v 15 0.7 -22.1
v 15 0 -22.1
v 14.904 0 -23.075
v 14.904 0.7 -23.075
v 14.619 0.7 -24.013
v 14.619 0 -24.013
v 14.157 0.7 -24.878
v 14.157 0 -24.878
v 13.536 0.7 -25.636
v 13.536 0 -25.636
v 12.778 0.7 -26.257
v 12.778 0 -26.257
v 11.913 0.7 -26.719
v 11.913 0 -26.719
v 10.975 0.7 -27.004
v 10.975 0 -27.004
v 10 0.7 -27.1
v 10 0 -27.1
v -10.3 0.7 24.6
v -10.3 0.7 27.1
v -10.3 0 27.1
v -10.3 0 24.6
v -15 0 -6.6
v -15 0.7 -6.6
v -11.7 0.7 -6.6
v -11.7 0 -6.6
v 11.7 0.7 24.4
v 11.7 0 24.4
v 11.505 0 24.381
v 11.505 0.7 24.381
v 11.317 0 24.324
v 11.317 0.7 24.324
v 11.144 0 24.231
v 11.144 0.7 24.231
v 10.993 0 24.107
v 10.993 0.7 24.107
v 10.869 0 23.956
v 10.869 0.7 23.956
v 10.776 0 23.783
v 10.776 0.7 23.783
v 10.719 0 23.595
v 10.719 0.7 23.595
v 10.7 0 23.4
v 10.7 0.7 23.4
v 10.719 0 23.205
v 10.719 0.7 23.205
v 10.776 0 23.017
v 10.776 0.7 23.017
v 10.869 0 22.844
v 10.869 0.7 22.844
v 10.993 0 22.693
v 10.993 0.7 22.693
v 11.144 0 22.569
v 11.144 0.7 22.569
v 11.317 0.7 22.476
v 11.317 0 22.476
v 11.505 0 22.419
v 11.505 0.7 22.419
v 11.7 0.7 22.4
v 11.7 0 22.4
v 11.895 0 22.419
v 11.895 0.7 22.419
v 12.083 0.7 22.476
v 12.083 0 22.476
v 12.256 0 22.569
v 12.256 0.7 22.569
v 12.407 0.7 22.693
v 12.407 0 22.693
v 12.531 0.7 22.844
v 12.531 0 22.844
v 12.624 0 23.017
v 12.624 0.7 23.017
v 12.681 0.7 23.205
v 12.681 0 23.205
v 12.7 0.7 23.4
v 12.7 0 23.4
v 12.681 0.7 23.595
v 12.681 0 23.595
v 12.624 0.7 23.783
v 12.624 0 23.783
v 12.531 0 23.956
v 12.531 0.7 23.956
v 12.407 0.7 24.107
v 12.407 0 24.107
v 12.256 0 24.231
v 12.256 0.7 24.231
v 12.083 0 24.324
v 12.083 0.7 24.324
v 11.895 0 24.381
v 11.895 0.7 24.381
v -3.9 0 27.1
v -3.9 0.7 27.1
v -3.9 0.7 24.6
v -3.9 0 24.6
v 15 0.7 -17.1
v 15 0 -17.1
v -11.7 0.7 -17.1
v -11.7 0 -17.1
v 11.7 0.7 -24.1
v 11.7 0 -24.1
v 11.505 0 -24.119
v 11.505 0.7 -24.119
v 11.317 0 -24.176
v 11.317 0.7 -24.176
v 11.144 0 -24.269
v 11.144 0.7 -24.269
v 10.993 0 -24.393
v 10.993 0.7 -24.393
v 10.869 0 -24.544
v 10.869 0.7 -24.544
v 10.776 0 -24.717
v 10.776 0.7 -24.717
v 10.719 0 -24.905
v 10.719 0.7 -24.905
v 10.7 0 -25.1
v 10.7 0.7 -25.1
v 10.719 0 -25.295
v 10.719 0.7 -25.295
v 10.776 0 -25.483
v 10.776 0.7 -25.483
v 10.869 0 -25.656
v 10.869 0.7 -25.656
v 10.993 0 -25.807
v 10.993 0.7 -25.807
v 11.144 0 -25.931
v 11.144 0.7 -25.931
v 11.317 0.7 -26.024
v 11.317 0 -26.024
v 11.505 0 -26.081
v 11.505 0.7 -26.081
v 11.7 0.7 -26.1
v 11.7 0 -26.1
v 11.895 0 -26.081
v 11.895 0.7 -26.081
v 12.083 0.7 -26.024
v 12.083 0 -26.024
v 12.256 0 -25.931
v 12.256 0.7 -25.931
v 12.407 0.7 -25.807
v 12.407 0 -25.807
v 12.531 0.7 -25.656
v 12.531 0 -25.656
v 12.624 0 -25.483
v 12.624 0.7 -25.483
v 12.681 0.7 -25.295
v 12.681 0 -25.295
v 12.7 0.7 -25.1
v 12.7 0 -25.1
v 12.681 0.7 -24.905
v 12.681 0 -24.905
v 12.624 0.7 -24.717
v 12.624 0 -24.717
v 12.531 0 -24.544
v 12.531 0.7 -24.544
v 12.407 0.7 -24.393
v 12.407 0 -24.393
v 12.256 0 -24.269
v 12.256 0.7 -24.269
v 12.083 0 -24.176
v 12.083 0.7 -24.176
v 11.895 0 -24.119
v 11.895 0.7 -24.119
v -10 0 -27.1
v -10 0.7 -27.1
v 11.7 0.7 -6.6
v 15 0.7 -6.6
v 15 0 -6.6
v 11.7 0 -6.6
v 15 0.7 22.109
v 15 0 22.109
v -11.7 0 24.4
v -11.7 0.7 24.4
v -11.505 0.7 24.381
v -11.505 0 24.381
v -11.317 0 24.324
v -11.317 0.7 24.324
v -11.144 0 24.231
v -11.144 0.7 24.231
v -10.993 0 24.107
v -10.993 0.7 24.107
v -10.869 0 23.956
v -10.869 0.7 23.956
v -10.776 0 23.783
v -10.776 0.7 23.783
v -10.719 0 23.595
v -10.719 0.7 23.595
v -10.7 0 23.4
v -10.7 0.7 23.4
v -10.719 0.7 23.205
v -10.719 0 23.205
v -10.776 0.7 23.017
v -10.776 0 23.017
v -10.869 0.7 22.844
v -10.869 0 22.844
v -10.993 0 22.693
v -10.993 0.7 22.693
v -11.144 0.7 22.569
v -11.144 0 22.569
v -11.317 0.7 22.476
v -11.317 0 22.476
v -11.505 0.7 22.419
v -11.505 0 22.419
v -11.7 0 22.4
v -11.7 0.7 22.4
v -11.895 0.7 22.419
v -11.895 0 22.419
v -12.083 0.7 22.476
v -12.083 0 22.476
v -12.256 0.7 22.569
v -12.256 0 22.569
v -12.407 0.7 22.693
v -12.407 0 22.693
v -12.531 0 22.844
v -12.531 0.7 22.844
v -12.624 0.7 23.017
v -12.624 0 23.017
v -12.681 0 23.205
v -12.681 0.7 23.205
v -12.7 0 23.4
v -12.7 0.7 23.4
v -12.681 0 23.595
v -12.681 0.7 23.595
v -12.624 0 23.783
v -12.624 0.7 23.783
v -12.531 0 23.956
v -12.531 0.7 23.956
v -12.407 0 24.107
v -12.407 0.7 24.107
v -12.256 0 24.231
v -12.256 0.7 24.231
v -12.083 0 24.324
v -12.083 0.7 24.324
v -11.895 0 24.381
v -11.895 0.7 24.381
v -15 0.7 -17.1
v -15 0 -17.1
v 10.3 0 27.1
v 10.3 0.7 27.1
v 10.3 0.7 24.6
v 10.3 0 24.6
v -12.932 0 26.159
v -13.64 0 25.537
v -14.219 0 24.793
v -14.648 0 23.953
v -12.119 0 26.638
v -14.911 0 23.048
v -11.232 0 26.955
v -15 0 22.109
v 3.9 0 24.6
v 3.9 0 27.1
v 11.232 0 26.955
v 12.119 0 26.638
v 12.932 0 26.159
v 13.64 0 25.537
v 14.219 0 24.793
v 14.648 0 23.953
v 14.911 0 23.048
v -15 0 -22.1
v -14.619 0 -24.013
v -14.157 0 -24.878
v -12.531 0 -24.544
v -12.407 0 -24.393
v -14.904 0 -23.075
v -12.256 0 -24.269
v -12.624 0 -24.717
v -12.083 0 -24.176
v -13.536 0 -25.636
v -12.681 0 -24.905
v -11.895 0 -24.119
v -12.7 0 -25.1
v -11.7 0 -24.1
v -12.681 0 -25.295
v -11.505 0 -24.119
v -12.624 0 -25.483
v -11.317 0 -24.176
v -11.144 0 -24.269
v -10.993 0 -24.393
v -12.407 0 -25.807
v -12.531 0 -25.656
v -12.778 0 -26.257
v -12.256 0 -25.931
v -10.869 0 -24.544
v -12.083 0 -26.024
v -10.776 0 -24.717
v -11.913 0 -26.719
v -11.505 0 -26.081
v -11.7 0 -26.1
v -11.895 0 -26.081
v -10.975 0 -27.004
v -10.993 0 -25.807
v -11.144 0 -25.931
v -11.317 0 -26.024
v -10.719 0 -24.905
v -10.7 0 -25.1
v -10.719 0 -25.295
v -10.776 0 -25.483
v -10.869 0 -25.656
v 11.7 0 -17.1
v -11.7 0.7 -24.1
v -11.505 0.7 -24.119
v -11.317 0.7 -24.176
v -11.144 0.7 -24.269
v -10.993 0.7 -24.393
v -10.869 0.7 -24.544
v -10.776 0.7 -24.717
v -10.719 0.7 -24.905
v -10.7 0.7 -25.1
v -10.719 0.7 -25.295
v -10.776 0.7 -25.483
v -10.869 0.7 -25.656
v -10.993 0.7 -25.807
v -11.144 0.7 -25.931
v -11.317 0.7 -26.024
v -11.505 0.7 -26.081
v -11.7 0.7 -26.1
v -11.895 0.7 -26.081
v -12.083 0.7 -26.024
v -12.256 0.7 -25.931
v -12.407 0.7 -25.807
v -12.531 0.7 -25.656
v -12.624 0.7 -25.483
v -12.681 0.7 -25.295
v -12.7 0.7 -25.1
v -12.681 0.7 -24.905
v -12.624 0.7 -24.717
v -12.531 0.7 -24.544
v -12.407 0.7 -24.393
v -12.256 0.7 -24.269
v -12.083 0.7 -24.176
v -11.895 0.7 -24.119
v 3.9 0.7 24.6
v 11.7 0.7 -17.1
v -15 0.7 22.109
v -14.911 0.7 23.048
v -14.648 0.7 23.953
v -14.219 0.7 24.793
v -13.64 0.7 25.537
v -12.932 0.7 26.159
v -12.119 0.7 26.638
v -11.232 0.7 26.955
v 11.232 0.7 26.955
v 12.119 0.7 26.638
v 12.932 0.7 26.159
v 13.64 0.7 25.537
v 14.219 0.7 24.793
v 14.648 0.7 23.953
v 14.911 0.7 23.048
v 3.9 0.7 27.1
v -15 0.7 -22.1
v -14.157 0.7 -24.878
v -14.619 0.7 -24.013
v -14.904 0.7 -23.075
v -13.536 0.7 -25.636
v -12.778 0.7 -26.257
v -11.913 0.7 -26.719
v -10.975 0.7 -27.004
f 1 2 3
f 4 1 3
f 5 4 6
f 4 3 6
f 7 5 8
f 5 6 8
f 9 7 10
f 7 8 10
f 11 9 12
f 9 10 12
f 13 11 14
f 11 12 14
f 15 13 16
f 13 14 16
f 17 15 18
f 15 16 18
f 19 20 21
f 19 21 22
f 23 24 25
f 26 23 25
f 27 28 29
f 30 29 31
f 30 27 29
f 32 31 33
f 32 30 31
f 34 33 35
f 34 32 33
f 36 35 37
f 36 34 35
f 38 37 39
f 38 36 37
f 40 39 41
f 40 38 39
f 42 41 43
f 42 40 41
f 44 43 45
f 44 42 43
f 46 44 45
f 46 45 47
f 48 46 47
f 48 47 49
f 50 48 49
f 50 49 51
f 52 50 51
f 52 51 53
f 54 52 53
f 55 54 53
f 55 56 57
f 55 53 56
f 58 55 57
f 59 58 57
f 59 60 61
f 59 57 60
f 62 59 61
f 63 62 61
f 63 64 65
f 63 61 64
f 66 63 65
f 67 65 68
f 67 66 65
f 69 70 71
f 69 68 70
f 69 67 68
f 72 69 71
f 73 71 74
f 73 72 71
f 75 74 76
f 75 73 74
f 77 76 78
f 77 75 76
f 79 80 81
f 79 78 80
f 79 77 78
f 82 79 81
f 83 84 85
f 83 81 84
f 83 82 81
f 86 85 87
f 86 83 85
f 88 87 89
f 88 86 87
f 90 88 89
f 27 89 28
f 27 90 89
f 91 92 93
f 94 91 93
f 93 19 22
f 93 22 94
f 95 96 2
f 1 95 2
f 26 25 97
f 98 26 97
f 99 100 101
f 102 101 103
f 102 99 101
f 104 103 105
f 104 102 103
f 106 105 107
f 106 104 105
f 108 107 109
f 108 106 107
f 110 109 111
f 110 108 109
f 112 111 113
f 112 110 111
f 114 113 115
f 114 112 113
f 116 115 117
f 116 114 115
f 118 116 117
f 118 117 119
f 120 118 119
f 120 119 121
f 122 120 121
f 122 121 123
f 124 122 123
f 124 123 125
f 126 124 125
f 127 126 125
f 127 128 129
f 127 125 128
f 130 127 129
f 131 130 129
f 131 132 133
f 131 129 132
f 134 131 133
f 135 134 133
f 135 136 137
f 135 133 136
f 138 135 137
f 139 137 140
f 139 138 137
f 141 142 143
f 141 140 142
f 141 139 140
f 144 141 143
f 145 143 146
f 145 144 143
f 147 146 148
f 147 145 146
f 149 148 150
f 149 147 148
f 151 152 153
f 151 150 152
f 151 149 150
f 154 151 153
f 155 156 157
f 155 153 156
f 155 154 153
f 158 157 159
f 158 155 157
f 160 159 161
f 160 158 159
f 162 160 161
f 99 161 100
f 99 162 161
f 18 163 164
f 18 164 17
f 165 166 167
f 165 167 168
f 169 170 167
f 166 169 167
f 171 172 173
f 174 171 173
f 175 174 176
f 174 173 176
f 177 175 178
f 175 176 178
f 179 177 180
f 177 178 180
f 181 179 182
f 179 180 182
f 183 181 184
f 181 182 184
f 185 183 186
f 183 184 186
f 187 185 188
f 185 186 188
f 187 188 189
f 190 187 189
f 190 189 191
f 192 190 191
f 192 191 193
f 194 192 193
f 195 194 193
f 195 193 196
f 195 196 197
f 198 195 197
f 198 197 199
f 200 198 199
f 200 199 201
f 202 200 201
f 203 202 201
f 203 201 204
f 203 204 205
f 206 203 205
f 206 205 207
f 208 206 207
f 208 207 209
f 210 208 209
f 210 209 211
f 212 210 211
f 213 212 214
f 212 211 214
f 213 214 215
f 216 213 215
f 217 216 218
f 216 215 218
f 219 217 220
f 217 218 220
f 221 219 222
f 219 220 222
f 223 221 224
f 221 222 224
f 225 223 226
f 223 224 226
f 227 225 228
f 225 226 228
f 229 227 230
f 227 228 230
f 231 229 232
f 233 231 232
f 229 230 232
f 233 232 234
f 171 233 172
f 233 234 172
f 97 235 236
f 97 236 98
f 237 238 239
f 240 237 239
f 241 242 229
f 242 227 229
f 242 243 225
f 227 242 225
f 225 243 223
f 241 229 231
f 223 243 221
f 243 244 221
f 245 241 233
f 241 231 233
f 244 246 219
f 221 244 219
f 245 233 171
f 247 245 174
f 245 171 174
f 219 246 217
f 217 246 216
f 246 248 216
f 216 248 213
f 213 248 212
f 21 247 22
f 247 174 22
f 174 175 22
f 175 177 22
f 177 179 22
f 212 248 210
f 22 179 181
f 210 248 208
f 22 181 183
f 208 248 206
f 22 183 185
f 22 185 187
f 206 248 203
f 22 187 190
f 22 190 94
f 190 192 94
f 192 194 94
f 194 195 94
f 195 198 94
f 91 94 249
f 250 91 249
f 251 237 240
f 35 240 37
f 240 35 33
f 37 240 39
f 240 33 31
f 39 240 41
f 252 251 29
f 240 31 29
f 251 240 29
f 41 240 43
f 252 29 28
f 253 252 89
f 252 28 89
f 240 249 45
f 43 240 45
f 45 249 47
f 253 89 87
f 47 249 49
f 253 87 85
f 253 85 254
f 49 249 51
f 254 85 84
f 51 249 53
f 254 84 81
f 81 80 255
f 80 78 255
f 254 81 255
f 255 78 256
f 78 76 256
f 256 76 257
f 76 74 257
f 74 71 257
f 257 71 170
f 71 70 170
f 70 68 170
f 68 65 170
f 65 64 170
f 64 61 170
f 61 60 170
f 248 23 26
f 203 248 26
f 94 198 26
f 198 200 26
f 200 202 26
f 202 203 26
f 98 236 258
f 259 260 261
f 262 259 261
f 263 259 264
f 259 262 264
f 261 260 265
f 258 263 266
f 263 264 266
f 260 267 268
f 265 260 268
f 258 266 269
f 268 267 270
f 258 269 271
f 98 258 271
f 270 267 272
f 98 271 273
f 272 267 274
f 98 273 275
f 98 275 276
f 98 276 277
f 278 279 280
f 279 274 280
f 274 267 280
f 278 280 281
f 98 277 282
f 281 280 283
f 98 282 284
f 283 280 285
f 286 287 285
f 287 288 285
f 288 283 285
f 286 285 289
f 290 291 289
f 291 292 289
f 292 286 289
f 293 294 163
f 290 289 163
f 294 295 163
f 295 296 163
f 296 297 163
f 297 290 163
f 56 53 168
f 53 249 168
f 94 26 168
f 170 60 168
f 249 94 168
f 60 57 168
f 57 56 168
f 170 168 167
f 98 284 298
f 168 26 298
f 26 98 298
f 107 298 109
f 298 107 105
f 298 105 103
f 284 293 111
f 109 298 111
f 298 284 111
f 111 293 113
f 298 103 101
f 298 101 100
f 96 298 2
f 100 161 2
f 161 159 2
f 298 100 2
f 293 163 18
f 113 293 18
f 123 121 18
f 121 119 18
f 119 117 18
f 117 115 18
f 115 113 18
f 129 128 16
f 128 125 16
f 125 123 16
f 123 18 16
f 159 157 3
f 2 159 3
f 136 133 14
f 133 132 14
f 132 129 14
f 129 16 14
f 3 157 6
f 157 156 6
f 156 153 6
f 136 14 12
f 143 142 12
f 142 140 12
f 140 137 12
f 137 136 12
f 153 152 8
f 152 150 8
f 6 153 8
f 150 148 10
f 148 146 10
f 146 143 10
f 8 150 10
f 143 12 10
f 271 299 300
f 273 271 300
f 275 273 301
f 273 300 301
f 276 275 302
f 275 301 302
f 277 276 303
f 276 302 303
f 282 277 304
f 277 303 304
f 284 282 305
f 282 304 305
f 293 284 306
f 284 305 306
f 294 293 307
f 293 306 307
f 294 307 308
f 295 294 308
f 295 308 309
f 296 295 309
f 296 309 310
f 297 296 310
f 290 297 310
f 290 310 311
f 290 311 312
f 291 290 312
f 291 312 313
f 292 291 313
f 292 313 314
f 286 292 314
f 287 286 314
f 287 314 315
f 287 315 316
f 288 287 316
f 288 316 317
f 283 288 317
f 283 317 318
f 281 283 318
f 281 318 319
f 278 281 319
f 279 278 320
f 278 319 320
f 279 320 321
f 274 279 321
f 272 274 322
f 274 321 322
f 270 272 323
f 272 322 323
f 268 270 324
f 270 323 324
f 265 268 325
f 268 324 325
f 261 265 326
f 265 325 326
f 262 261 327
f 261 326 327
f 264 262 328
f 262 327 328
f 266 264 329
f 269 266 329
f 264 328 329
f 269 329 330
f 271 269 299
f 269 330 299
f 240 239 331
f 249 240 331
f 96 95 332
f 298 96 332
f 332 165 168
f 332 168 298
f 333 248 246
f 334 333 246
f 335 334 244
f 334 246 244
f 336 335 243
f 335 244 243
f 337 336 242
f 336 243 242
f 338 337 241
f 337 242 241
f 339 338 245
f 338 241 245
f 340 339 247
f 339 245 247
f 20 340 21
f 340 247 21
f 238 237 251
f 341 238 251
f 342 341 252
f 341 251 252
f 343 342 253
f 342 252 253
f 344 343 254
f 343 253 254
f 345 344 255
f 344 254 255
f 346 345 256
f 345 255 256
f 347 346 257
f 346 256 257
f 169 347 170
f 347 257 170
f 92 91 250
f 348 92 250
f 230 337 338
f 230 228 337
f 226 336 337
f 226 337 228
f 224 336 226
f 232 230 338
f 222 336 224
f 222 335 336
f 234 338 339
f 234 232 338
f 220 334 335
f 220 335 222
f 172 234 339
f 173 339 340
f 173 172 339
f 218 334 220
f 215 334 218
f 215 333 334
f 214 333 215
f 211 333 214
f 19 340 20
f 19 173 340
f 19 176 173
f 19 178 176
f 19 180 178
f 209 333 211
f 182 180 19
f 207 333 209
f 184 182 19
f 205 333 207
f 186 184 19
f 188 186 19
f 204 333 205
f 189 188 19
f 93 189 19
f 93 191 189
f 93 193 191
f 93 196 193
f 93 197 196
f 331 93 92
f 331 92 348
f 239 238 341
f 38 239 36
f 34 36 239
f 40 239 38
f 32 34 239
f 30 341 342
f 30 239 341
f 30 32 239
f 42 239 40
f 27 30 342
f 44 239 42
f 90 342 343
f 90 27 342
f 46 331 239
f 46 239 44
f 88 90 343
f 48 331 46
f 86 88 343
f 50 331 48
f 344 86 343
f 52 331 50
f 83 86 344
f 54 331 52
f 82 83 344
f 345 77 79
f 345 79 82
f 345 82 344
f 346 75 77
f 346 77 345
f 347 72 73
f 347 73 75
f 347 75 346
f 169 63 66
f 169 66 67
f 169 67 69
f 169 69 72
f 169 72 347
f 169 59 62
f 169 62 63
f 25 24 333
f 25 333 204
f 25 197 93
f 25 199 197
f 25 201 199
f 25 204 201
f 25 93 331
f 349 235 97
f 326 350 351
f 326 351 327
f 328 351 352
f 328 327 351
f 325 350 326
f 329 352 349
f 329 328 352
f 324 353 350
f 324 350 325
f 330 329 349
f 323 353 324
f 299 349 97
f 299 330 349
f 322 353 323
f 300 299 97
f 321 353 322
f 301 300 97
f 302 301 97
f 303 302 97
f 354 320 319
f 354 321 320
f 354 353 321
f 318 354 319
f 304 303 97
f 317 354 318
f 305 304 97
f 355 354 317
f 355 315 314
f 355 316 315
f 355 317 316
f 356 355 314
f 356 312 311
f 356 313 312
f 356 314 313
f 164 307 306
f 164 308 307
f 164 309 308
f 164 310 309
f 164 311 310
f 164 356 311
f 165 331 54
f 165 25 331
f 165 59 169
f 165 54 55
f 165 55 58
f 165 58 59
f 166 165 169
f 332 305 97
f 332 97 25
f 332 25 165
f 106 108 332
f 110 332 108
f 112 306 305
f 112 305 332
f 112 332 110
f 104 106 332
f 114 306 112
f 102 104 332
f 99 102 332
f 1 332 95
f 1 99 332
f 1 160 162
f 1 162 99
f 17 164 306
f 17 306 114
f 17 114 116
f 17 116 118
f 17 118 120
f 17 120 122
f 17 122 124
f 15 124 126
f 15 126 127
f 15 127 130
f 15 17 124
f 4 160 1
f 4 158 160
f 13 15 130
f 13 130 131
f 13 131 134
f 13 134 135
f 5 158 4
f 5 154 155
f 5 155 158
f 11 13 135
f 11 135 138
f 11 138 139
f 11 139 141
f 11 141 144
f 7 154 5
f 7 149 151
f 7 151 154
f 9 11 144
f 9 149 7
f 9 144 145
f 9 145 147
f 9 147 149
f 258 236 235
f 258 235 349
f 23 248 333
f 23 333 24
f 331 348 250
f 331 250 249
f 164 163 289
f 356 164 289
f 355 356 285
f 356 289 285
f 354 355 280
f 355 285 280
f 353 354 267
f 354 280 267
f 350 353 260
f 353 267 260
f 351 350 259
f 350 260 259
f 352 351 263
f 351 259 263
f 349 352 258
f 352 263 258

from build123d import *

# Parameters (mm, degrees)
SKETCH2_W          = 30
SKETCH2_H          = 54.2
CIRCUITBOARD_DEPTH = 0.7
SKETCH3_W          = 3.3
SKETCH3_H          = 10.5
SKETCH3_W_2        = 6.4
SKETCH3_H_2        = 2.5
CUT_EXTRUDE1_DEPTH = 31.982252985
FILLET2_R          = 5
SKETCH4_R          = 1
SCREWHOLES_DEPTH   = 31.982252985


with BuildPart() as part:
    # Sketch2 → CircuitBoard (new body)
    with BuildSketch(Plane(origin=(0, 0, 0), x_dir=(1, 0, 0), z_dir=(0, 1, 0))):
        Rectangle(SKETCH2_W, SKETCH2_H)
    extrude(amount=CIRCUITBOARD_DEPTH)

    # Sketch3 → Cut-Extrude1 (cut, through all)
    with BuildSketch(Plane(origin=(0, 0.7, 0), x_dir=(1, 0, 0), z_dir=(0, 1, 0))):
        with Locations((-13.35, 11.85)):
            Rectangle(SKETCH3_W, SKETCH3_H)
        with Locations((-7.1, -25.85)):
            Rectangle(SKETCH3_W_2, SKETCH3_H_2)
    cut_extrude1 = extrude(amount=-CUT_EXTRUDE1_DEPTH, mode=Mode.SUBTRACT)

    # Cut_Mirror: Cut-Extrude1 across plane
    add(cut_extrude1.mirror(Plane(origin=(0, 0, 0), x_dir=(0, 0, 1), z_dir=(1, 0, 0))), mode=Mode.SUBTRACT)

    # Cut_Mirror at the second plane: Cut-Extrude1 across plane
    add(cut_extrude1.mirror(Plane.ZX), mode=Mode.SUBTRACT)

    # Fillet2
    # the kernel refuses this fillet: 5 mm, written as the material it takes off along each edge
    with BuildSketch(Plane(origin=(-15, -12.477479713, 27.1), x_dir=(0, 0, -1), z_dir=(0, 1, 0))) as fillet2_piece_1:
        with BuildLine():
            CenterArc((4.990991885, -5), FILLET2_R, 90, 86.560187232)
            Line((0, -4.7), (-0.099819838, -4.694))
            ThreePointArc((-0.099819838, -4.694), (-0.1, -2.35), (-0.1, 0))
            Line((-0.1, 0), (0, 0.1))
            Line((0, 0.1), (4.990991885, 0.1))
            Line((4.990991885, 0.1), (4.990991885, 0))
        make_face()
    extrude(amount=25.654959427, mode=Mode.SUBTRACT)
    with BuildSketch(Plane(origin=(15, -12.477479713, 27.1), x_dir=(-1, 0, 0), z_dir=(0, 1, 0))) as fillet2_piece_2:
        with BuildLine():
            CenterArc((5, -4.990991885), FILLET2_R, 93.439812768, 86.560187232)
            Line((0, -4.990991885), (-0.1, -4.990991885))
            Line((-0.1, -4.990991885), (-0.1, 0))
            Line((-0.1, 0), (0, 0.1))
            ThreePointArc((0, 0.1), (2.35, 0.1), (4.694, 0.099819838))
            Line((4.694, 0.099819838), (4.7, 0))
        make_face()
    extrude(amount=25.654959427, mode=Mode.SUBTRACT)
    with BuildSketch(Plane(origin=(15, -12.5, -27.1), x_dir=(-1, 0, 0), z_dir=(0, 1, 0))) as fillet2_piece_3:
        with BuildLine():
            CenterArc((FILLET2_R, FILLET2_R), FILLET2_R, 180, 90)
            Line((0, FILLET2_R), (-FILLET2_R * 0.02, FILLET2_R))
            Line((-FILLET2_R * 0.02, FILLET2_R), (-FILLET2_R * 0.02, -FILLET2_R * 0.02))
            Line((-FILLET2_R * 0.02, -FILLET2_R * 0.02), (FILLET2_R, -FILLET2_R * 0.02))
            Line((FILLET2_R, -FILLET2_R * 0.02), (FILLET2_R, 0))
        make_face()
    extrude(amount=25.7, mode=Mode.SUBTRACT)
    with BuildSketch(Plane(origin=(-15, -12.5, -27.1), x_dir=(1, 0, 0), z_dir=(0, 1, 0))) as fillet2_piece_4:
        with BuildLine():
            CenterArc((FILLET2_R, -FILLET2_R), FILLET2_R, 90, 90)
            Line((0, -FILLET2_R), (-FILLET2_R * 0.02, -FILLET2_R))
            Line((-FILLET2_R * 0.02, -FILLET2_R), (-FILLET2_R * 0.02, FILLET2_R * 0.02))
            Line((-FILLET2_R * 0.02, FILLET2_R * 0.02), (FILLET2_R, FILLET2_R * 0.02))
            Line((FILLET2_R, FILLET2_R * 0.02), (FILLET2_R, 0))
        make_face()
    extrude(amount=25.7, mode=Mode.SUBTRACT)

    # Sketch4 → ScrewHoles (cut, through all)
    with BuildSketch(Plane(origin=(0, 0.7, 0), x_dir=(1, 0, 0), z_dir=(0, 1, 0))):
        with Locations(Location((-11.7, 25.1, 0), (0, 0, 270))):
            Circle(SKETCH4_R)
        with Locations(Location((-11.7, -23.4, 0), (0, 0, 270))):
            Circle(SKETCH4_R)
    screwholes = extrude(amount=-SCREWHOLES_DEPTH, mode=Mode.SUBTRACT)

    # ScrewHoles_Mirror: ScrewHoles across plane
    add(screwholes.mirror(Plane(origin=(0, 0, 0), x_dir=(0, 0, 1), z_dir=(1, 0, 0))), mode=Mode.SUBTRACT)

    # ScrewHoles_Mirror at the second plane: ScrewHoles across plane
    add(screwholes.mirror(Plane.ZX), mode=Mode.SUBTRACT)


solid = part.part
